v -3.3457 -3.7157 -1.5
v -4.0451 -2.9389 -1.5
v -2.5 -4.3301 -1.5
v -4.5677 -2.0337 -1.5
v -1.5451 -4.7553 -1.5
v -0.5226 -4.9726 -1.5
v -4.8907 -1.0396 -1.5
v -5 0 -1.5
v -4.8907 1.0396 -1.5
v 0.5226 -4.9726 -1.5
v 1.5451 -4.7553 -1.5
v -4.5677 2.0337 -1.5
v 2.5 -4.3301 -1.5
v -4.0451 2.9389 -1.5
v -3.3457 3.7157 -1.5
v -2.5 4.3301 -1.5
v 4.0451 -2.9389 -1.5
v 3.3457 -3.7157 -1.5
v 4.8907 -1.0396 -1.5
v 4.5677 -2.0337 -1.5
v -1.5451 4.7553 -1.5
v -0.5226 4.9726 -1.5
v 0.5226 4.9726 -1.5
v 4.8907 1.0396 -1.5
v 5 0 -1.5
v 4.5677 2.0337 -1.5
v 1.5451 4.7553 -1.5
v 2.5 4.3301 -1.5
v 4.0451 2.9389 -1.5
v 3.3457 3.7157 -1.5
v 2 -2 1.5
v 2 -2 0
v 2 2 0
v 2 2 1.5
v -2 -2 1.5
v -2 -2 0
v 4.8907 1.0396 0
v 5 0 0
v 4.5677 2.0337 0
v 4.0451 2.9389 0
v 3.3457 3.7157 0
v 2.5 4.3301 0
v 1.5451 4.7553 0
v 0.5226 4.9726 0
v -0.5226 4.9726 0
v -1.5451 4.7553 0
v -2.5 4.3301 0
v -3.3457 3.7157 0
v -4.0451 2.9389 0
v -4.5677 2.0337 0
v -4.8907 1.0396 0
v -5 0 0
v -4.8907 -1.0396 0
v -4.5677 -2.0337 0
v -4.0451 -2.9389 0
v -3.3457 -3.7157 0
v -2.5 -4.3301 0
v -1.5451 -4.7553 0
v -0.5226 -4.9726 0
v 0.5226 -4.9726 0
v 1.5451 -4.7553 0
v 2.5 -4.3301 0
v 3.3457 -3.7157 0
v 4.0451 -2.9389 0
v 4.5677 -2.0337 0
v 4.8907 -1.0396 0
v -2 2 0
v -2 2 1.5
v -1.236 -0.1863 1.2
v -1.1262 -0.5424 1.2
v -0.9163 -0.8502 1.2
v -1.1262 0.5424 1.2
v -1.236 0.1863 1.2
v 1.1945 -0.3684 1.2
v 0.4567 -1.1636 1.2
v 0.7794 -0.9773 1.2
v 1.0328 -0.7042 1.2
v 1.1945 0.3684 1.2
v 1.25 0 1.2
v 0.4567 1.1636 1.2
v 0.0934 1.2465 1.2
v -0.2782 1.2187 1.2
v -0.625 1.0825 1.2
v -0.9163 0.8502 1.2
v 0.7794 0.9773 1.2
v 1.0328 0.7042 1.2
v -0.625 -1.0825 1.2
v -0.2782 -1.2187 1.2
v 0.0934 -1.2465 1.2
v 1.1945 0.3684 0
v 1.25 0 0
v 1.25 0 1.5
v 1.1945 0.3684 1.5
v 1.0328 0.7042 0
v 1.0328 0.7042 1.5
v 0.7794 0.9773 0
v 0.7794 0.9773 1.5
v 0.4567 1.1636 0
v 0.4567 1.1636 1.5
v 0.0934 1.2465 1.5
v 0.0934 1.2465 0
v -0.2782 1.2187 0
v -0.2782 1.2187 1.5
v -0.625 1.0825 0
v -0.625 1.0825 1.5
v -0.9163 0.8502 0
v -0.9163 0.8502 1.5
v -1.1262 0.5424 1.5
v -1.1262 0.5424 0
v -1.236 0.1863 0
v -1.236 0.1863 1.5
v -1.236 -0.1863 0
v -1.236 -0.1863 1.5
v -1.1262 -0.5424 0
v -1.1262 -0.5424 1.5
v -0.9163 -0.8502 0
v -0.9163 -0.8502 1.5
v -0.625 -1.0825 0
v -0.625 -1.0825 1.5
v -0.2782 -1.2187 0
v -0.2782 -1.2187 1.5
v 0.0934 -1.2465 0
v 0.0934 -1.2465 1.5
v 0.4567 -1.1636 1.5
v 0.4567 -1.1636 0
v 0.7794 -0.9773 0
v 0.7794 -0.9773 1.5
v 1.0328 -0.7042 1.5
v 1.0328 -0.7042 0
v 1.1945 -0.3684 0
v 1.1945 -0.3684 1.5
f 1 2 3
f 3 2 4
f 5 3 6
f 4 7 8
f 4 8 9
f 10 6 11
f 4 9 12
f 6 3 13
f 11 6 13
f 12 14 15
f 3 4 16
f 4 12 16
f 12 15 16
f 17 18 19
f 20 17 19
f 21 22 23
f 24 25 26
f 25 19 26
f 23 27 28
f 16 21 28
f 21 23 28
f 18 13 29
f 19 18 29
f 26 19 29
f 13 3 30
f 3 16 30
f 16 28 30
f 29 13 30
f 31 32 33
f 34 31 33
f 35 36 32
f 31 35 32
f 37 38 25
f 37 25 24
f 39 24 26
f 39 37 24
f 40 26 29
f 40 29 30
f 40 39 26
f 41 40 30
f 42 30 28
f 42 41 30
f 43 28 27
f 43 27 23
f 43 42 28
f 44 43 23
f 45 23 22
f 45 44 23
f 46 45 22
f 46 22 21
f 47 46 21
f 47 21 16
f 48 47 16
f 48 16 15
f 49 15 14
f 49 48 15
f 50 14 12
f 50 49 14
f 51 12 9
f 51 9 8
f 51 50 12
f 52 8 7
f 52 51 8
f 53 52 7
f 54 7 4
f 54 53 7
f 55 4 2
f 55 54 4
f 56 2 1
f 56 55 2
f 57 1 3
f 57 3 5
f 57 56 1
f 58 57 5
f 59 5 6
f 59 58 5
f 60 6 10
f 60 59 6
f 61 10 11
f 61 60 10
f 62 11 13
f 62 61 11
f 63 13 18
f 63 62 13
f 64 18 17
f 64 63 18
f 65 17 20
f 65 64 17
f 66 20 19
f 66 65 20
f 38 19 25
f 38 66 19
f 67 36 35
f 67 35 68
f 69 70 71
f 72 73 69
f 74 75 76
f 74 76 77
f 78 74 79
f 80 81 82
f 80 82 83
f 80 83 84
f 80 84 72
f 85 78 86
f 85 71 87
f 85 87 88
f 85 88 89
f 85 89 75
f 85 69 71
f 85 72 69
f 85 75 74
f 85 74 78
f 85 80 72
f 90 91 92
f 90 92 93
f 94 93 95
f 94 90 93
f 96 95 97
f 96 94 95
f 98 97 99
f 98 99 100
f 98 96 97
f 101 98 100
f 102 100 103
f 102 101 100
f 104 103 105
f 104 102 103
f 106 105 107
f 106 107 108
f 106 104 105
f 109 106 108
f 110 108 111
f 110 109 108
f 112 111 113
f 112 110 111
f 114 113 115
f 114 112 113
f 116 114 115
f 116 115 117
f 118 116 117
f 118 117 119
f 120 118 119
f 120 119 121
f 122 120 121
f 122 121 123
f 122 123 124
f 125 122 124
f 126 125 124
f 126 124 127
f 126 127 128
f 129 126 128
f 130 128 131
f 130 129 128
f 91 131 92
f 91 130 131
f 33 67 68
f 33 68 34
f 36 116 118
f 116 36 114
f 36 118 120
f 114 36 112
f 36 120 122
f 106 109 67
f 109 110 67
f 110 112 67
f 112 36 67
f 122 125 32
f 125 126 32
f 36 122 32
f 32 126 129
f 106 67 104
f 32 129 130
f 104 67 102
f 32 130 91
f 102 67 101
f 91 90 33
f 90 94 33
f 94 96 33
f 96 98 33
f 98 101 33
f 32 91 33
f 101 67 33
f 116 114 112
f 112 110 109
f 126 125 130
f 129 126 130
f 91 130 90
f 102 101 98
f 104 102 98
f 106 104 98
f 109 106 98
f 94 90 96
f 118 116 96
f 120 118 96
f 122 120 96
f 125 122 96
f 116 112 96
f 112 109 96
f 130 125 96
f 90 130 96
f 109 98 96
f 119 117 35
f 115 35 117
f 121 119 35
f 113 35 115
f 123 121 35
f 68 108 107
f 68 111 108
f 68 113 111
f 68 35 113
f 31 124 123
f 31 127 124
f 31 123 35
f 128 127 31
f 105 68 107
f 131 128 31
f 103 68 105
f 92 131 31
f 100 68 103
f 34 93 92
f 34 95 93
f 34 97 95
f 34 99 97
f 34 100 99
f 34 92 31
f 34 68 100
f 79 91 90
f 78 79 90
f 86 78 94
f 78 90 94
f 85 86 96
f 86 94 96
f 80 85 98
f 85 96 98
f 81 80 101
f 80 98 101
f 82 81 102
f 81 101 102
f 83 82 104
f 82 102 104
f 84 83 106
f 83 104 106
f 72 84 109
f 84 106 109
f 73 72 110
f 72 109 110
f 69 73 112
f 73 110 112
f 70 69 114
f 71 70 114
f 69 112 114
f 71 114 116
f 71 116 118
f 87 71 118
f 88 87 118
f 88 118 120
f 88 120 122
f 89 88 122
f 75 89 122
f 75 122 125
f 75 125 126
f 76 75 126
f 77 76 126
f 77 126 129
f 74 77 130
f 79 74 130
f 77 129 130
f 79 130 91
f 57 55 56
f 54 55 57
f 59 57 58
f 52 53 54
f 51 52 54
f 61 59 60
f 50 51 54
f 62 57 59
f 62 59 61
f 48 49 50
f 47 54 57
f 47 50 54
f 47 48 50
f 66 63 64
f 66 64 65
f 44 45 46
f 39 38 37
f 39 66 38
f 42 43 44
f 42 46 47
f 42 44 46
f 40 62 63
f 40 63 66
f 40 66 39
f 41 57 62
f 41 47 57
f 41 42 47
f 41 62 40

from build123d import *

# Parameters (mm, degrees)
F0_R     = 5
F0_W     = 4
F0_H     = 4
F0_R_2   = 1.25
F1_DEPTH = 1.5
F2_DEPTH = 1.5
F3_DEPTH = 1.2


with BuildPart() as f1:
    # F0 (on Top) → F1 (new body)
    with BuildSketch(Plane.XY):
        Circle(F0_R)
        Rectangle(F0_W, F0_H, mode=Mode.SUBTRACT)
        Rectangle(F0_W, F0_H)
        Circle(F0_R_2, mode=Mode.SUBTRACT)
        Circle(F0_R_2)
    extrude(amount=-F1_DEPTH)


with BuildPart() as f2:
    # F0 (on Top) → F2 (new body)
    with BuildSketch(Plane.XY):
        Rectangle(F0_W, F0_H)
        Circle(F0_R_2, mode=Mode.SUBTRACT)
    extrude(amount=F2_DEPTH)


with BuildPart() as f3:
    # F0 (on Top) → F3 (new body)
    with BuildSketch(Plane.XY):
        Circle(F0_R_2)
    extrude(amount=F3_DEPTH)


solid = Compound([f1.part, f2.part, f3.part])
